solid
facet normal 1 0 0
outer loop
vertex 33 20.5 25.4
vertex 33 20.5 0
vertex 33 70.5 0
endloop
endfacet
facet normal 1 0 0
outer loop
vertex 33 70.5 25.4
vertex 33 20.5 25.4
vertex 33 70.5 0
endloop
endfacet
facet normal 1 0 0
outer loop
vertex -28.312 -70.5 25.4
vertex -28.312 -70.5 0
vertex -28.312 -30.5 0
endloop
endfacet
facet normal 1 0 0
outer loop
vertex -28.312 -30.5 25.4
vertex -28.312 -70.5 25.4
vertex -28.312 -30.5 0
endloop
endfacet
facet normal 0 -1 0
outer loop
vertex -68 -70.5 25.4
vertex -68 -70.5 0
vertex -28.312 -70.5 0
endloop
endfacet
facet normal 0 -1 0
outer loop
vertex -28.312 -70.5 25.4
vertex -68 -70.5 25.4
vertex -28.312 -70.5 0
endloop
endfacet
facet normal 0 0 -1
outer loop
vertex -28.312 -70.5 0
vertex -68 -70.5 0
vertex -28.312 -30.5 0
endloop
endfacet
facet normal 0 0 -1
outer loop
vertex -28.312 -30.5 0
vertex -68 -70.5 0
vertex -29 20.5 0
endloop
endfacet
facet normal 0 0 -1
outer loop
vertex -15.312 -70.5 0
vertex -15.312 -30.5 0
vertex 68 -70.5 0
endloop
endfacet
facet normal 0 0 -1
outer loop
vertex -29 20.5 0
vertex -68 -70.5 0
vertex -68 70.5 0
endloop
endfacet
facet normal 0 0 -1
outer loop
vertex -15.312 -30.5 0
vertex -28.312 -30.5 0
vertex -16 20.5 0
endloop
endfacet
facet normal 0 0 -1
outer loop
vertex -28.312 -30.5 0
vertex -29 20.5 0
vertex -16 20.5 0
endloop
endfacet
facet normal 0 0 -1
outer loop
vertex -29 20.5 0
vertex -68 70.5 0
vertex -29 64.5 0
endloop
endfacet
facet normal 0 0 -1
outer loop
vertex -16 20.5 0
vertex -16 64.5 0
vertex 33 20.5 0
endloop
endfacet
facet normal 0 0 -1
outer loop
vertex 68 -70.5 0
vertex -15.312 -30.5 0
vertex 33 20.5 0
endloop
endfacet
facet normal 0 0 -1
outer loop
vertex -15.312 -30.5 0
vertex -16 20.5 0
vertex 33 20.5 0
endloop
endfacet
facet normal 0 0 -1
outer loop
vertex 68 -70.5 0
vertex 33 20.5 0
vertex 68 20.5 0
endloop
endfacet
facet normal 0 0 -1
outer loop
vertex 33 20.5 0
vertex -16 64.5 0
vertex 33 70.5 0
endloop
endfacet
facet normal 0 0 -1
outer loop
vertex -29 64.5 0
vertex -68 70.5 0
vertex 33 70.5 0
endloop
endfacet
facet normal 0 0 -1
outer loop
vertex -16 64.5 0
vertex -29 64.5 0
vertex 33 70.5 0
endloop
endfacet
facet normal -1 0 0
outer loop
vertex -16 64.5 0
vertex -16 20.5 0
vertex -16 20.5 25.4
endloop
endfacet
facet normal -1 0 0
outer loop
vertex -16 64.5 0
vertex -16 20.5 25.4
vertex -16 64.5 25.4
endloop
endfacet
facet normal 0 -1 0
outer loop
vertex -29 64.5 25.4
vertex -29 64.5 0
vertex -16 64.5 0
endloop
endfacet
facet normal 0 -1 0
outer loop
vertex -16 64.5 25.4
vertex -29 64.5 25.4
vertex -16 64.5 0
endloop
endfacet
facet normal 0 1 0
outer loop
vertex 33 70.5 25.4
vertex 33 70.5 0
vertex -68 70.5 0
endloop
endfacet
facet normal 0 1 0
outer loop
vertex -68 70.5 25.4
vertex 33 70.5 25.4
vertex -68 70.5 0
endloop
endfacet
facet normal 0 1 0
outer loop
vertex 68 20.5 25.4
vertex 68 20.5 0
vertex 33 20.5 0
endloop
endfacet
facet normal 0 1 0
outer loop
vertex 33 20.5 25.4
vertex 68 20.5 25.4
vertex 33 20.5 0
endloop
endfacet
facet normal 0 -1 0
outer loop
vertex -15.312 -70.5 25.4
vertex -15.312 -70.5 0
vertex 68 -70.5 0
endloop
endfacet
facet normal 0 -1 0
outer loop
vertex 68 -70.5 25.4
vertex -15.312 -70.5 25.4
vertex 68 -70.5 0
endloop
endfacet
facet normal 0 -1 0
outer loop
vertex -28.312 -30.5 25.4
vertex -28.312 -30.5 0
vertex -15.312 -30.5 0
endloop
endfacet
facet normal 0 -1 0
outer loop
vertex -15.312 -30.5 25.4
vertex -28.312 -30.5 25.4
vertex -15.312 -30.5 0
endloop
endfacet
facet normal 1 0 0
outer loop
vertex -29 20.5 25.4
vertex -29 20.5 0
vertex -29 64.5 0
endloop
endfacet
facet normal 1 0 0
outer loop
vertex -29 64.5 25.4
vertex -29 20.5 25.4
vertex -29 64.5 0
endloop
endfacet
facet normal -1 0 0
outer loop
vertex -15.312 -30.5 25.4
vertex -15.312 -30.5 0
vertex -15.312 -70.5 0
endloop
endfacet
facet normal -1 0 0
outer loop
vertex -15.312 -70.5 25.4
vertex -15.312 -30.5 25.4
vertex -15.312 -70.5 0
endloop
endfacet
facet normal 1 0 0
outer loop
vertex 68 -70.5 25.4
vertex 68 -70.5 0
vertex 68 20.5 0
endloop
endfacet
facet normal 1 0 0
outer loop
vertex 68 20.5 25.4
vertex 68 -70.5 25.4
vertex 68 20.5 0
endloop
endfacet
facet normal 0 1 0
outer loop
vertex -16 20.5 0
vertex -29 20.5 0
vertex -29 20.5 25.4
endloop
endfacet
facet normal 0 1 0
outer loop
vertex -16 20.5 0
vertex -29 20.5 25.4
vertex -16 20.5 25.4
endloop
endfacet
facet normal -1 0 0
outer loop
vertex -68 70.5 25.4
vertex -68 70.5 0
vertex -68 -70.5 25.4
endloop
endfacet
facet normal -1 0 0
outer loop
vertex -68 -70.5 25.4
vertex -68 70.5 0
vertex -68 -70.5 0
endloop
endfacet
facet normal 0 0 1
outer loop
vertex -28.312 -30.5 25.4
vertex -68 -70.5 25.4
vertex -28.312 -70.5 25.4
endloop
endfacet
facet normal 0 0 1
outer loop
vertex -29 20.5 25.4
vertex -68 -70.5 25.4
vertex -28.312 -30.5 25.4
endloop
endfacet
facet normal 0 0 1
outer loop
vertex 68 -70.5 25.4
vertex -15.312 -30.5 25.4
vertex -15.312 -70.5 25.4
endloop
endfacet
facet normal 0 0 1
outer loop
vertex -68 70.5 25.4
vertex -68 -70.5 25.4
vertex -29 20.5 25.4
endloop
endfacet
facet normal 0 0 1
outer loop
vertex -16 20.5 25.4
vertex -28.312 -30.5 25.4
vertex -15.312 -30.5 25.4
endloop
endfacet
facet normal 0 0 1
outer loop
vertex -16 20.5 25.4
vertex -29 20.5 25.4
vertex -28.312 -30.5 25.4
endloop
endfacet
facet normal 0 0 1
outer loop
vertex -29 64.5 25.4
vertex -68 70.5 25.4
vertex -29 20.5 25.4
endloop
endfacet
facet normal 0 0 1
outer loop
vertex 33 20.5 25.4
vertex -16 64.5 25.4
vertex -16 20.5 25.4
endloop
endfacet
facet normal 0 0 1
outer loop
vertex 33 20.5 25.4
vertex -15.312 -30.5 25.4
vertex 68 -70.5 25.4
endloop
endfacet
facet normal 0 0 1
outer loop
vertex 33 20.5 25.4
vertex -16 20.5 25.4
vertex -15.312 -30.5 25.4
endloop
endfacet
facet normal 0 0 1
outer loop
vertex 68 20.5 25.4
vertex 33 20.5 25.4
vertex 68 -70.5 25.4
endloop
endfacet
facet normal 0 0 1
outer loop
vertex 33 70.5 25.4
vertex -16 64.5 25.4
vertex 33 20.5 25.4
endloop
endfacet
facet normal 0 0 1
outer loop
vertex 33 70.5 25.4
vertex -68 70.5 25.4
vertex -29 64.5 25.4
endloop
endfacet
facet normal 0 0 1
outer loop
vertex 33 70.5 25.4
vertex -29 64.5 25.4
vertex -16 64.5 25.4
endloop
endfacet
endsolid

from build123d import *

# Parameters (mm, degrees)
F0_W     = 13
F0_H     = 44
F1_DEPTH = 25.4


with BuildPart() as f1:
    # F0 (on Top) → F1 (new body)
    with BuildSketch(Plane.XY):
        Polygon((33, 20.5), (33, 70.5), (-68, 70.5), (-68, -70.5), (-28.3125, -70.5), (-28.3125, -30.5), (-15.3125, -30.5), (-15.3125, -70.5), (68, -70.5), (68, 20.5), align=None)
        with Locations((-22.5, 42.5)):
            Rectangle(F0_W, F0_H, mode=Mode.SUBTRACT)
    extrude(amount=F1_DEPTH)


solid = f1.part
